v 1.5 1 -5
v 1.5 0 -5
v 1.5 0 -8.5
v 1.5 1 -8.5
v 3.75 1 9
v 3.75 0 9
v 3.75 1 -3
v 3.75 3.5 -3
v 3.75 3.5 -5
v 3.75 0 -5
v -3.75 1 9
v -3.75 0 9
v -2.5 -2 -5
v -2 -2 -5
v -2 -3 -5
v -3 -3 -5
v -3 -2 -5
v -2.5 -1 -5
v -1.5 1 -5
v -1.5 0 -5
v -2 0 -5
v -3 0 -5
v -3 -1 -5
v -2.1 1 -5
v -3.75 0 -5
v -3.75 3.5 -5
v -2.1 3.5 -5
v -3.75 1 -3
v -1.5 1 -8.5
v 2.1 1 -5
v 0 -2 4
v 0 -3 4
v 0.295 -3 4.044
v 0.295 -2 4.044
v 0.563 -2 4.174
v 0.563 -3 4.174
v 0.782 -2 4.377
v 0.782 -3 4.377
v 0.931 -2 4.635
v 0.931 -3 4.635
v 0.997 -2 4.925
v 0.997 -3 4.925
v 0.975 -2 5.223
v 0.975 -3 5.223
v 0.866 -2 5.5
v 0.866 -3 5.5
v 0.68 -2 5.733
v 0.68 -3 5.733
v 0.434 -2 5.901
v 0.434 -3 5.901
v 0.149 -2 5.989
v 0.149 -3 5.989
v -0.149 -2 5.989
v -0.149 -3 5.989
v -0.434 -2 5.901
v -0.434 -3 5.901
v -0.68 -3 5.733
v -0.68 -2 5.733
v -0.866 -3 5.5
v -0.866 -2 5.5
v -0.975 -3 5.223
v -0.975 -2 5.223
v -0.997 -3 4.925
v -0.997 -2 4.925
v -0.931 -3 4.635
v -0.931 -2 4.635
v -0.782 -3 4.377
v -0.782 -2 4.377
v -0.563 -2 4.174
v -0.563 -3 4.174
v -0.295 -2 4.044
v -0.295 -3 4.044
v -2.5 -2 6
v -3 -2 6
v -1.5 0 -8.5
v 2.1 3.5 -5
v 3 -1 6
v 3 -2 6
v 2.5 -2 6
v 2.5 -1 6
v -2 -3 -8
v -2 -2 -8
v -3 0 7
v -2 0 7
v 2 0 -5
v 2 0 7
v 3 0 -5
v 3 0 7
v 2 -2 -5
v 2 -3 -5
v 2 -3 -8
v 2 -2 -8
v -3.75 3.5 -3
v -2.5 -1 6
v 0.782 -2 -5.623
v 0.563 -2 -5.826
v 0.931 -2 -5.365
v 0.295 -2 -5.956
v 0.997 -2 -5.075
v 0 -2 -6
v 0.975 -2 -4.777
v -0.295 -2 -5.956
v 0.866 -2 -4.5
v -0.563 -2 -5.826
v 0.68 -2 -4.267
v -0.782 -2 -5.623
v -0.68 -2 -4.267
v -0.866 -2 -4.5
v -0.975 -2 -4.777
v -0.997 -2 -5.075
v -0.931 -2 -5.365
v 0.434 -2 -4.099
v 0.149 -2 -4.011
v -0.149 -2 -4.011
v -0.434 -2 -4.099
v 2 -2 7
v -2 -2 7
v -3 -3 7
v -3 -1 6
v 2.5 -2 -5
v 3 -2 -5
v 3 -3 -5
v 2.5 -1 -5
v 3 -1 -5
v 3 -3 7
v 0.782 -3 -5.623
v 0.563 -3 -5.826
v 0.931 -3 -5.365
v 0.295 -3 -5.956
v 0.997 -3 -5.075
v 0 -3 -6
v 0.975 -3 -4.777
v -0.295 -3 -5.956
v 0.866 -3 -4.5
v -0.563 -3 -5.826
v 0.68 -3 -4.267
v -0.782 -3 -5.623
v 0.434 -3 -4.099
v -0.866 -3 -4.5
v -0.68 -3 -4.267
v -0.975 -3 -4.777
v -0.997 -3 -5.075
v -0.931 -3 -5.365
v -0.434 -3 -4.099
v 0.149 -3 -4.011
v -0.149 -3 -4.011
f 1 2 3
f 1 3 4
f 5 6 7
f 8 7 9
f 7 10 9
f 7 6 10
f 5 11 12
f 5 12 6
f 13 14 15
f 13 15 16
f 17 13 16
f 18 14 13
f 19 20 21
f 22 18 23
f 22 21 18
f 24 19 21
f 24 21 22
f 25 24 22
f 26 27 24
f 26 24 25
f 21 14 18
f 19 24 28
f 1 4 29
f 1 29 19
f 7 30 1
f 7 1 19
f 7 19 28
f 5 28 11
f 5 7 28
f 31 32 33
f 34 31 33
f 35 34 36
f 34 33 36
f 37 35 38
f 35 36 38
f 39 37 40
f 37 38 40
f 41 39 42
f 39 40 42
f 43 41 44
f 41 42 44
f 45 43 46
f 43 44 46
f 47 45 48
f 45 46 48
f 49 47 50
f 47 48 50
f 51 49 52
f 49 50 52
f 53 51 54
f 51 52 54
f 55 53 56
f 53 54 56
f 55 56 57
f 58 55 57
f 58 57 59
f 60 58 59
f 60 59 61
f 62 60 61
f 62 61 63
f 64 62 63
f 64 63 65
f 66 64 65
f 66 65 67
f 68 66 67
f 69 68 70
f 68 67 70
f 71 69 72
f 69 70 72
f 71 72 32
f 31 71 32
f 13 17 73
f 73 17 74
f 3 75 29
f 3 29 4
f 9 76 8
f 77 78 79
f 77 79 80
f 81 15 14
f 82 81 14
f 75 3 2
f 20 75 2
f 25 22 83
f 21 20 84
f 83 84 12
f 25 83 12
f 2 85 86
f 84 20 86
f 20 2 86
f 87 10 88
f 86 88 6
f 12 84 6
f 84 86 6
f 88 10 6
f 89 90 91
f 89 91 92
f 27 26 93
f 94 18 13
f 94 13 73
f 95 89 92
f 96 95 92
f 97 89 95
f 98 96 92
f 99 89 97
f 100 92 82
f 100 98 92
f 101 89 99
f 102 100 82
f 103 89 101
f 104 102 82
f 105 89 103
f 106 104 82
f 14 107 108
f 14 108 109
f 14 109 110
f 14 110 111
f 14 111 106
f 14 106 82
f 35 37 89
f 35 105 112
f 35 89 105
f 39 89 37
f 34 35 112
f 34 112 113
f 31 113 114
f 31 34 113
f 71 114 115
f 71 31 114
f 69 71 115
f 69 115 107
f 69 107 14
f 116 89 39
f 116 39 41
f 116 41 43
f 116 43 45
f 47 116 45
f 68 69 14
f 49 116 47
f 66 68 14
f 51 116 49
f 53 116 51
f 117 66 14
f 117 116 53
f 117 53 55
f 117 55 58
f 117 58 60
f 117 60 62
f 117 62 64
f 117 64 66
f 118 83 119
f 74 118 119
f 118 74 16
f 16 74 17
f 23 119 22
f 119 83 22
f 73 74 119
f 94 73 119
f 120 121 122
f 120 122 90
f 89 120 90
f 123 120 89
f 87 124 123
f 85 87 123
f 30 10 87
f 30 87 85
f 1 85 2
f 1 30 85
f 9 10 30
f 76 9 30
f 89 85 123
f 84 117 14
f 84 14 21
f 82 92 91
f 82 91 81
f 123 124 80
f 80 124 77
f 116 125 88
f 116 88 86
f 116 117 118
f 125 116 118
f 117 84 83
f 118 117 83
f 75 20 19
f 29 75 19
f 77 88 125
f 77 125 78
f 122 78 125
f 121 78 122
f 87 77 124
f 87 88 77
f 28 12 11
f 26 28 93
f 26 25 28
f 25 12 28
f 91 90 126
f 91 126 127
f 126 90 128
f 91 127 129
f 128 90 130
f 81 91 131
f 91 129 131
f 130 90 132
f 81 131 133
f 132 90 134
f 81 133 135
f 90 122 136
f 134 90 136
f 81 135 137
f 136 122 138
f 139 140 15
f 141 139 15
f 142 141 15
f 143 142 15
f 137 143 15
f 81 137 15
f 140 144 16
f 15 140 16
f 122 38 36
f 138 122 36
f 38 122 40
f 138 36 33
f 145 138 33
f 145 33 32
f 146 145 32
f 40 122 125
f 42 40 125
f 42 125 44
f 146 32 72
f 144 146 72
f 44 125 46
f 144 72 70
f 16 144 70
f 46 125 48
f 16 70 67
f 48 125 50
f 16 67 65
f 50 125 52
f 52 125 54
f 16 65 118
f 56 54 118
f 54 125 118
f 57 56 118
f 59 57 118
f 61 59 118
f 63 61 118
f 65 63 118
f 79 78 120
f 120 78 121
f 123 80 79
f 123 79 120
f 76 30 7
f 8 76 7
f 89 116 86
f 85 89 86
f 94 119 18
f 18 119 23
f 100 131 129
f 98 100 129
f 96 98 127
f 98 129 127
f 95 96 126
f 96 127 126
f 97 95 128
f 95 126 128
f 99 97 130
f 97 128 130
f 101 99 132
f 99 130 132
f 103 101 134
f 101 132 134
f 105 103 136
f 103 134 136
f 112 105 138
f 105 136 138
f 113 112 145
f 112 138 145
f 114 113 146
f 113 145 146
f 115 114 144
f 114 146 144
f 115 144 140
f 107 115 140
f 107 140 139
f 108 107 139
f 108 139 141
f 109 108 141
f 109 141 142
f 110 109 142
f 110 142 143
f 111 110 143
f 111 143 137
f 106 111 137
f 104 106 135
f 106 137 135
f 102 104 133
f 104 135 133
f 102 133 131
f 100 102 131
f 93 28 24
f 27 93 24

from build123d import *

# Parameters (mm, degrees)
SKETCH1_W            = 7.5
SKETCH1_H            = 10
BOSS_EXTRUDE1_DEPTH  = 1
BOSS_EXTRUDE2_DEPTH  = 2.5
SKETCH10_W           = 7.5
SKETCH10_H           = 1
BOSS_EXTRUDE5_DEPTH  = 2
SKETCH56_W           = 7.5
SKETCH56_H           = 1
BOSS_EXTRUDE17_DEPTH = 2
SKETCH57_W           = 3
SKETCH57_H           = 1
BOSS_EXTRUDE18_DEPTH = 5
SKETCH58_W           = 1.5
SKETCH58_H           = 1
BOSS_EXTRUDE19_DEPTH = 2
SKETCH59_W           = 1.5
SKETCH59_H           = 1
BOSS_EXTRUDE20_DEPTH = 2
SKETCH60_W           = 1
SKETCH60_H           = 1.5
BOSS_EXTRUDE23_DEPTH = 1.5
SKETCH61_W           = 1
SKETCH61_H           = 0.75
CUT_EXTRUDE1_DEPTH   = 0.5
SKETCH62_W           = 6
SKETCH62_H           = 12
BOSS_EXTRUDE25_DEPTH = 3
SKETCH64_W           = 4
SKETCH64_H           = 2
CUT_EXTRUDE2_DEPTH   = 12
SKETCH65_W           = 4
SKETCH65_H           = 1
BOSS_EXTRUDE26_DEPTH = 3
SKETCH66_R           = 1
CUT_EXTRUDE3_DEPTH   = 1
SKETCH68_W           = 6
SKETCH68_H           = 1
SKETCH68_W_2         = 3
SKETCH68_W_3         = 2
CUT_EXTRUDE6_DEPTH   = 0.5
SKETCH67_W           = 6
SKETCH67_H           = 1
SKETCH67_W_2         = 3
SKETCH67_W_3         = 2
CUT_EXTRUDE7_DEPTH   = 0.5
SKETCH69_W           = 7
SKETCH69_H           = 1.5
CUT_EXTRUDE8_DEPTH   = 10


with BuildPart() as part:
    # Sketch1 → Boss-Extrude1 (new body)
    with BuildSketch(Plane(origin=(0, 0, 0), x_dir=(1, 0, 0), z_dir=(0, 1, 0))):
        Rectangle(SKETCH1_W, SKETCH1_H)
    extrude(amount=BOSS_EXTRUDE1_DEPTH)

    # Sketch2 → Boss-Extrude2 (add)
    with BuildSketch(Plane(origin=(0, 1, 0), x_dir=(1, 0, 0), z_dir=(0, 1, 0))):
        Polygon((-3.75, 3), (-2.1, 5), (-3.75, 5), align=None)
        Polygon((3.75, 5), (2.1, 5), (3.75, 3), align=None)
    extrude(amount=BOSS_EXTRUDE2_DEPTH)

    # Sketch10 → Boss-Extrude5 (add)
    with BuildSketch(Plane.XY.offset(5)):
        with Locations((0, 0.5)):
            Rectangle(SKETCH10_W, SKETCH10_H)
    extrude(amount=BOSS_EXTRUDE5_DEPTH)

    # Sketch56 → Boss-Extrude17 (add)
    with BuildSketch(Plane.XY.offset(7)):
        with Locations((0, 0.5)):
            Rectangle(SKETCH56_W, SKETCH56_H)
    extrude(amount=BOSS_EXTRUDE17_DEPTH)

    # Sketch57 → Boss-Extrude18 (add)
    with BuildSketch(Plane(origin=(0, 0, -5), x_dir=(-1, 0, 0), z_dir=(0, 0, -1))):
        with Locations((0, 0.5)):
            Rectangle(SKETCH57_W, SKETCH57_H)
    extrude(amount=BOSS_EXTRUDE18_DEPTH)

    # Sketch58 → Boss-Extrude19 (add)
    with BuildSketch(Plane(origin=(1.5, 0, 0), x_dir=(0, 0, -1), z_dir=(1, 0, 0))):
        with Locations((9.25, 0.5)):
            Rectangle(SKETCH58_W, SKETCH58_H)
    extrude(amount=BOSS_EXTRUDE19_DEPTH)

    # Sketch59 → Boss-Extrude20 (add)
    with BuildSketch(Plane.ZY.offset(1.5)):
        with Locations((-9.25, 0.5)):
            Rectangle(SKETCH59_W, SKETCH59_H)
    extrude(amount=BOSS_EXTRUDE20_DEPTH)

    # Sketch60 → Boss-Extrude23 (add)
    with BuildSketch(Plane(origin=(0, 1, 0), x_dir=(1, 0, 0), z_dir=(0, 1, 0))):
        with Locations((3, 9.25)):
            Rectangle(SKETCH60_W, SKETCH60_H)
        with Locations((-3, 9.25)):
            Rectangle(SKETCH60_W, SKETCH60_H)
    extrude(amount=BOSS_EXTRUDE23_DEPTH)

    # Sketch61 → Cut-Extrude1 (cut)
    with BuildSketch(Plane(origin=(0, 2.5, 0), x_dir=(1, 0, 0), z_dir=(0, 1, 0))):
        with Locations((-3, 9.245443114)):
            Rectangle(SKETCH61_W, SKETCH61_H)
        with Locations((3, 9.245443114)):
            Rectangle(SKETCH61_W, SKETCH61_H)
    extrude(amount=-CUT_EXTRUDE1_DEPTH, mode=Mode.SUBTRACT)

    # Sketch62 → Boss-Extrude25 (add)
    with BuildSketch(Plane(origin=(0, 0, 0), x_dir=(-1, 0, 0), z_dir=(0, -1, 0))):
        with Locations((0, -1)):
            Rectangle(SKETCH62_W, SKETCH62_H)
    extrude(amount=BOSS_EXTRUDE25_DEPTH)

    # Sketch64 → Cut-Extrude2 (cut)
    with BuildSketch(Plane.XY.offset(7)):
        with Locations((0, -1)):
            Rectangle(SKETCH64_W, SKETCH64_H)
    extrude(amount=-CUT_EXTRUDE2_DEPTH, mode=Mode.SUBTRACT)

    # Sketch65 → Boss-Extrude26 (add)
    with BuildSketch(Plane(origin=(0, 0, -5), x_dir=(-1, 0, 0), z_dir=(0, 0, -1))):
        with Locations((0, -2.5)):
            Rectangle(SKETCH65_W, SKETCH65_H)
    extrude(amount=BOSS_EXTRUDE26_DEPTH)

    # Sketch66 → Cut-Extrude3 (cut)
    with BuildSketch(Plane(origin=(0, -3, 0), x_dir=(-1, 0, 0), z_dir=(0, -1, 0))):
        with Locations(Location((0, -5, 0), (0, 0, 90))):  # turned: the seam where the file's is
            Circle(SKETCH66_R)
        with Locations(Location((0, 5, 0), (0, 0, 90))):  # turned: the seam where the file's is
            Circle(SKETCH66_R)
    extrude(amount=-CUT_EXTRUDE3_DEPTH, mode=Mode.SUBTRACT)

    # Sketch68 → Cut-Extrude6 (cut)
    with BuildSketch(Plane(origin=(3, 0, 0), x_dir=(0, 0, -1), z_dir=(1, 0, 0))):
        with Locations((-3, -1.5)):
            Rectangle(SKETCH68_W, SKETCH68_H)
        with Locations((1.5, -1.5)):
            Rectangle(SKETCH68_W_2, SKETCH68_H)
        with Locations((4, -1.5)):
            Rectangle(SKETCH68_W_3, SKETCH68_H)
    extrude(amount=-CUT_EXTRUDE6_DEPTH, mode=Mode.SUBTRACT)

    # Sketch67 → Cut-Extrude7 (cut)
    with BuildSketch(Plane.ZY.offset(3)):
        with Locations((3, -1.5)):
            Rectangle(SKETCH67_W, SKETCH67_H)
        with Locations((-1.5, -1.5)):
            Rectangle(SKETCH67_W_2, SKETCH67_H)
        with Locations((-4, -1.5)):
            Rectangle(SKETCH67_W_3, SKETCH67_H)
    extrude(amount=-CUT_EXTRUDE7_DEPTH, mode=Mode.SUBTRACT)

    # Sketch69 → Cut-Extrude8 (cut)
    with BuildSketch(Plane.XZ):
        with Locations((0, -9.25)):
            Rectangle(SKETCH69_W, SKETCH69_H)
    extrude(amount=-CUT_EXTRUDE8_DEPTH, mode=Mode.SUBTRACT)


solid = part.part
